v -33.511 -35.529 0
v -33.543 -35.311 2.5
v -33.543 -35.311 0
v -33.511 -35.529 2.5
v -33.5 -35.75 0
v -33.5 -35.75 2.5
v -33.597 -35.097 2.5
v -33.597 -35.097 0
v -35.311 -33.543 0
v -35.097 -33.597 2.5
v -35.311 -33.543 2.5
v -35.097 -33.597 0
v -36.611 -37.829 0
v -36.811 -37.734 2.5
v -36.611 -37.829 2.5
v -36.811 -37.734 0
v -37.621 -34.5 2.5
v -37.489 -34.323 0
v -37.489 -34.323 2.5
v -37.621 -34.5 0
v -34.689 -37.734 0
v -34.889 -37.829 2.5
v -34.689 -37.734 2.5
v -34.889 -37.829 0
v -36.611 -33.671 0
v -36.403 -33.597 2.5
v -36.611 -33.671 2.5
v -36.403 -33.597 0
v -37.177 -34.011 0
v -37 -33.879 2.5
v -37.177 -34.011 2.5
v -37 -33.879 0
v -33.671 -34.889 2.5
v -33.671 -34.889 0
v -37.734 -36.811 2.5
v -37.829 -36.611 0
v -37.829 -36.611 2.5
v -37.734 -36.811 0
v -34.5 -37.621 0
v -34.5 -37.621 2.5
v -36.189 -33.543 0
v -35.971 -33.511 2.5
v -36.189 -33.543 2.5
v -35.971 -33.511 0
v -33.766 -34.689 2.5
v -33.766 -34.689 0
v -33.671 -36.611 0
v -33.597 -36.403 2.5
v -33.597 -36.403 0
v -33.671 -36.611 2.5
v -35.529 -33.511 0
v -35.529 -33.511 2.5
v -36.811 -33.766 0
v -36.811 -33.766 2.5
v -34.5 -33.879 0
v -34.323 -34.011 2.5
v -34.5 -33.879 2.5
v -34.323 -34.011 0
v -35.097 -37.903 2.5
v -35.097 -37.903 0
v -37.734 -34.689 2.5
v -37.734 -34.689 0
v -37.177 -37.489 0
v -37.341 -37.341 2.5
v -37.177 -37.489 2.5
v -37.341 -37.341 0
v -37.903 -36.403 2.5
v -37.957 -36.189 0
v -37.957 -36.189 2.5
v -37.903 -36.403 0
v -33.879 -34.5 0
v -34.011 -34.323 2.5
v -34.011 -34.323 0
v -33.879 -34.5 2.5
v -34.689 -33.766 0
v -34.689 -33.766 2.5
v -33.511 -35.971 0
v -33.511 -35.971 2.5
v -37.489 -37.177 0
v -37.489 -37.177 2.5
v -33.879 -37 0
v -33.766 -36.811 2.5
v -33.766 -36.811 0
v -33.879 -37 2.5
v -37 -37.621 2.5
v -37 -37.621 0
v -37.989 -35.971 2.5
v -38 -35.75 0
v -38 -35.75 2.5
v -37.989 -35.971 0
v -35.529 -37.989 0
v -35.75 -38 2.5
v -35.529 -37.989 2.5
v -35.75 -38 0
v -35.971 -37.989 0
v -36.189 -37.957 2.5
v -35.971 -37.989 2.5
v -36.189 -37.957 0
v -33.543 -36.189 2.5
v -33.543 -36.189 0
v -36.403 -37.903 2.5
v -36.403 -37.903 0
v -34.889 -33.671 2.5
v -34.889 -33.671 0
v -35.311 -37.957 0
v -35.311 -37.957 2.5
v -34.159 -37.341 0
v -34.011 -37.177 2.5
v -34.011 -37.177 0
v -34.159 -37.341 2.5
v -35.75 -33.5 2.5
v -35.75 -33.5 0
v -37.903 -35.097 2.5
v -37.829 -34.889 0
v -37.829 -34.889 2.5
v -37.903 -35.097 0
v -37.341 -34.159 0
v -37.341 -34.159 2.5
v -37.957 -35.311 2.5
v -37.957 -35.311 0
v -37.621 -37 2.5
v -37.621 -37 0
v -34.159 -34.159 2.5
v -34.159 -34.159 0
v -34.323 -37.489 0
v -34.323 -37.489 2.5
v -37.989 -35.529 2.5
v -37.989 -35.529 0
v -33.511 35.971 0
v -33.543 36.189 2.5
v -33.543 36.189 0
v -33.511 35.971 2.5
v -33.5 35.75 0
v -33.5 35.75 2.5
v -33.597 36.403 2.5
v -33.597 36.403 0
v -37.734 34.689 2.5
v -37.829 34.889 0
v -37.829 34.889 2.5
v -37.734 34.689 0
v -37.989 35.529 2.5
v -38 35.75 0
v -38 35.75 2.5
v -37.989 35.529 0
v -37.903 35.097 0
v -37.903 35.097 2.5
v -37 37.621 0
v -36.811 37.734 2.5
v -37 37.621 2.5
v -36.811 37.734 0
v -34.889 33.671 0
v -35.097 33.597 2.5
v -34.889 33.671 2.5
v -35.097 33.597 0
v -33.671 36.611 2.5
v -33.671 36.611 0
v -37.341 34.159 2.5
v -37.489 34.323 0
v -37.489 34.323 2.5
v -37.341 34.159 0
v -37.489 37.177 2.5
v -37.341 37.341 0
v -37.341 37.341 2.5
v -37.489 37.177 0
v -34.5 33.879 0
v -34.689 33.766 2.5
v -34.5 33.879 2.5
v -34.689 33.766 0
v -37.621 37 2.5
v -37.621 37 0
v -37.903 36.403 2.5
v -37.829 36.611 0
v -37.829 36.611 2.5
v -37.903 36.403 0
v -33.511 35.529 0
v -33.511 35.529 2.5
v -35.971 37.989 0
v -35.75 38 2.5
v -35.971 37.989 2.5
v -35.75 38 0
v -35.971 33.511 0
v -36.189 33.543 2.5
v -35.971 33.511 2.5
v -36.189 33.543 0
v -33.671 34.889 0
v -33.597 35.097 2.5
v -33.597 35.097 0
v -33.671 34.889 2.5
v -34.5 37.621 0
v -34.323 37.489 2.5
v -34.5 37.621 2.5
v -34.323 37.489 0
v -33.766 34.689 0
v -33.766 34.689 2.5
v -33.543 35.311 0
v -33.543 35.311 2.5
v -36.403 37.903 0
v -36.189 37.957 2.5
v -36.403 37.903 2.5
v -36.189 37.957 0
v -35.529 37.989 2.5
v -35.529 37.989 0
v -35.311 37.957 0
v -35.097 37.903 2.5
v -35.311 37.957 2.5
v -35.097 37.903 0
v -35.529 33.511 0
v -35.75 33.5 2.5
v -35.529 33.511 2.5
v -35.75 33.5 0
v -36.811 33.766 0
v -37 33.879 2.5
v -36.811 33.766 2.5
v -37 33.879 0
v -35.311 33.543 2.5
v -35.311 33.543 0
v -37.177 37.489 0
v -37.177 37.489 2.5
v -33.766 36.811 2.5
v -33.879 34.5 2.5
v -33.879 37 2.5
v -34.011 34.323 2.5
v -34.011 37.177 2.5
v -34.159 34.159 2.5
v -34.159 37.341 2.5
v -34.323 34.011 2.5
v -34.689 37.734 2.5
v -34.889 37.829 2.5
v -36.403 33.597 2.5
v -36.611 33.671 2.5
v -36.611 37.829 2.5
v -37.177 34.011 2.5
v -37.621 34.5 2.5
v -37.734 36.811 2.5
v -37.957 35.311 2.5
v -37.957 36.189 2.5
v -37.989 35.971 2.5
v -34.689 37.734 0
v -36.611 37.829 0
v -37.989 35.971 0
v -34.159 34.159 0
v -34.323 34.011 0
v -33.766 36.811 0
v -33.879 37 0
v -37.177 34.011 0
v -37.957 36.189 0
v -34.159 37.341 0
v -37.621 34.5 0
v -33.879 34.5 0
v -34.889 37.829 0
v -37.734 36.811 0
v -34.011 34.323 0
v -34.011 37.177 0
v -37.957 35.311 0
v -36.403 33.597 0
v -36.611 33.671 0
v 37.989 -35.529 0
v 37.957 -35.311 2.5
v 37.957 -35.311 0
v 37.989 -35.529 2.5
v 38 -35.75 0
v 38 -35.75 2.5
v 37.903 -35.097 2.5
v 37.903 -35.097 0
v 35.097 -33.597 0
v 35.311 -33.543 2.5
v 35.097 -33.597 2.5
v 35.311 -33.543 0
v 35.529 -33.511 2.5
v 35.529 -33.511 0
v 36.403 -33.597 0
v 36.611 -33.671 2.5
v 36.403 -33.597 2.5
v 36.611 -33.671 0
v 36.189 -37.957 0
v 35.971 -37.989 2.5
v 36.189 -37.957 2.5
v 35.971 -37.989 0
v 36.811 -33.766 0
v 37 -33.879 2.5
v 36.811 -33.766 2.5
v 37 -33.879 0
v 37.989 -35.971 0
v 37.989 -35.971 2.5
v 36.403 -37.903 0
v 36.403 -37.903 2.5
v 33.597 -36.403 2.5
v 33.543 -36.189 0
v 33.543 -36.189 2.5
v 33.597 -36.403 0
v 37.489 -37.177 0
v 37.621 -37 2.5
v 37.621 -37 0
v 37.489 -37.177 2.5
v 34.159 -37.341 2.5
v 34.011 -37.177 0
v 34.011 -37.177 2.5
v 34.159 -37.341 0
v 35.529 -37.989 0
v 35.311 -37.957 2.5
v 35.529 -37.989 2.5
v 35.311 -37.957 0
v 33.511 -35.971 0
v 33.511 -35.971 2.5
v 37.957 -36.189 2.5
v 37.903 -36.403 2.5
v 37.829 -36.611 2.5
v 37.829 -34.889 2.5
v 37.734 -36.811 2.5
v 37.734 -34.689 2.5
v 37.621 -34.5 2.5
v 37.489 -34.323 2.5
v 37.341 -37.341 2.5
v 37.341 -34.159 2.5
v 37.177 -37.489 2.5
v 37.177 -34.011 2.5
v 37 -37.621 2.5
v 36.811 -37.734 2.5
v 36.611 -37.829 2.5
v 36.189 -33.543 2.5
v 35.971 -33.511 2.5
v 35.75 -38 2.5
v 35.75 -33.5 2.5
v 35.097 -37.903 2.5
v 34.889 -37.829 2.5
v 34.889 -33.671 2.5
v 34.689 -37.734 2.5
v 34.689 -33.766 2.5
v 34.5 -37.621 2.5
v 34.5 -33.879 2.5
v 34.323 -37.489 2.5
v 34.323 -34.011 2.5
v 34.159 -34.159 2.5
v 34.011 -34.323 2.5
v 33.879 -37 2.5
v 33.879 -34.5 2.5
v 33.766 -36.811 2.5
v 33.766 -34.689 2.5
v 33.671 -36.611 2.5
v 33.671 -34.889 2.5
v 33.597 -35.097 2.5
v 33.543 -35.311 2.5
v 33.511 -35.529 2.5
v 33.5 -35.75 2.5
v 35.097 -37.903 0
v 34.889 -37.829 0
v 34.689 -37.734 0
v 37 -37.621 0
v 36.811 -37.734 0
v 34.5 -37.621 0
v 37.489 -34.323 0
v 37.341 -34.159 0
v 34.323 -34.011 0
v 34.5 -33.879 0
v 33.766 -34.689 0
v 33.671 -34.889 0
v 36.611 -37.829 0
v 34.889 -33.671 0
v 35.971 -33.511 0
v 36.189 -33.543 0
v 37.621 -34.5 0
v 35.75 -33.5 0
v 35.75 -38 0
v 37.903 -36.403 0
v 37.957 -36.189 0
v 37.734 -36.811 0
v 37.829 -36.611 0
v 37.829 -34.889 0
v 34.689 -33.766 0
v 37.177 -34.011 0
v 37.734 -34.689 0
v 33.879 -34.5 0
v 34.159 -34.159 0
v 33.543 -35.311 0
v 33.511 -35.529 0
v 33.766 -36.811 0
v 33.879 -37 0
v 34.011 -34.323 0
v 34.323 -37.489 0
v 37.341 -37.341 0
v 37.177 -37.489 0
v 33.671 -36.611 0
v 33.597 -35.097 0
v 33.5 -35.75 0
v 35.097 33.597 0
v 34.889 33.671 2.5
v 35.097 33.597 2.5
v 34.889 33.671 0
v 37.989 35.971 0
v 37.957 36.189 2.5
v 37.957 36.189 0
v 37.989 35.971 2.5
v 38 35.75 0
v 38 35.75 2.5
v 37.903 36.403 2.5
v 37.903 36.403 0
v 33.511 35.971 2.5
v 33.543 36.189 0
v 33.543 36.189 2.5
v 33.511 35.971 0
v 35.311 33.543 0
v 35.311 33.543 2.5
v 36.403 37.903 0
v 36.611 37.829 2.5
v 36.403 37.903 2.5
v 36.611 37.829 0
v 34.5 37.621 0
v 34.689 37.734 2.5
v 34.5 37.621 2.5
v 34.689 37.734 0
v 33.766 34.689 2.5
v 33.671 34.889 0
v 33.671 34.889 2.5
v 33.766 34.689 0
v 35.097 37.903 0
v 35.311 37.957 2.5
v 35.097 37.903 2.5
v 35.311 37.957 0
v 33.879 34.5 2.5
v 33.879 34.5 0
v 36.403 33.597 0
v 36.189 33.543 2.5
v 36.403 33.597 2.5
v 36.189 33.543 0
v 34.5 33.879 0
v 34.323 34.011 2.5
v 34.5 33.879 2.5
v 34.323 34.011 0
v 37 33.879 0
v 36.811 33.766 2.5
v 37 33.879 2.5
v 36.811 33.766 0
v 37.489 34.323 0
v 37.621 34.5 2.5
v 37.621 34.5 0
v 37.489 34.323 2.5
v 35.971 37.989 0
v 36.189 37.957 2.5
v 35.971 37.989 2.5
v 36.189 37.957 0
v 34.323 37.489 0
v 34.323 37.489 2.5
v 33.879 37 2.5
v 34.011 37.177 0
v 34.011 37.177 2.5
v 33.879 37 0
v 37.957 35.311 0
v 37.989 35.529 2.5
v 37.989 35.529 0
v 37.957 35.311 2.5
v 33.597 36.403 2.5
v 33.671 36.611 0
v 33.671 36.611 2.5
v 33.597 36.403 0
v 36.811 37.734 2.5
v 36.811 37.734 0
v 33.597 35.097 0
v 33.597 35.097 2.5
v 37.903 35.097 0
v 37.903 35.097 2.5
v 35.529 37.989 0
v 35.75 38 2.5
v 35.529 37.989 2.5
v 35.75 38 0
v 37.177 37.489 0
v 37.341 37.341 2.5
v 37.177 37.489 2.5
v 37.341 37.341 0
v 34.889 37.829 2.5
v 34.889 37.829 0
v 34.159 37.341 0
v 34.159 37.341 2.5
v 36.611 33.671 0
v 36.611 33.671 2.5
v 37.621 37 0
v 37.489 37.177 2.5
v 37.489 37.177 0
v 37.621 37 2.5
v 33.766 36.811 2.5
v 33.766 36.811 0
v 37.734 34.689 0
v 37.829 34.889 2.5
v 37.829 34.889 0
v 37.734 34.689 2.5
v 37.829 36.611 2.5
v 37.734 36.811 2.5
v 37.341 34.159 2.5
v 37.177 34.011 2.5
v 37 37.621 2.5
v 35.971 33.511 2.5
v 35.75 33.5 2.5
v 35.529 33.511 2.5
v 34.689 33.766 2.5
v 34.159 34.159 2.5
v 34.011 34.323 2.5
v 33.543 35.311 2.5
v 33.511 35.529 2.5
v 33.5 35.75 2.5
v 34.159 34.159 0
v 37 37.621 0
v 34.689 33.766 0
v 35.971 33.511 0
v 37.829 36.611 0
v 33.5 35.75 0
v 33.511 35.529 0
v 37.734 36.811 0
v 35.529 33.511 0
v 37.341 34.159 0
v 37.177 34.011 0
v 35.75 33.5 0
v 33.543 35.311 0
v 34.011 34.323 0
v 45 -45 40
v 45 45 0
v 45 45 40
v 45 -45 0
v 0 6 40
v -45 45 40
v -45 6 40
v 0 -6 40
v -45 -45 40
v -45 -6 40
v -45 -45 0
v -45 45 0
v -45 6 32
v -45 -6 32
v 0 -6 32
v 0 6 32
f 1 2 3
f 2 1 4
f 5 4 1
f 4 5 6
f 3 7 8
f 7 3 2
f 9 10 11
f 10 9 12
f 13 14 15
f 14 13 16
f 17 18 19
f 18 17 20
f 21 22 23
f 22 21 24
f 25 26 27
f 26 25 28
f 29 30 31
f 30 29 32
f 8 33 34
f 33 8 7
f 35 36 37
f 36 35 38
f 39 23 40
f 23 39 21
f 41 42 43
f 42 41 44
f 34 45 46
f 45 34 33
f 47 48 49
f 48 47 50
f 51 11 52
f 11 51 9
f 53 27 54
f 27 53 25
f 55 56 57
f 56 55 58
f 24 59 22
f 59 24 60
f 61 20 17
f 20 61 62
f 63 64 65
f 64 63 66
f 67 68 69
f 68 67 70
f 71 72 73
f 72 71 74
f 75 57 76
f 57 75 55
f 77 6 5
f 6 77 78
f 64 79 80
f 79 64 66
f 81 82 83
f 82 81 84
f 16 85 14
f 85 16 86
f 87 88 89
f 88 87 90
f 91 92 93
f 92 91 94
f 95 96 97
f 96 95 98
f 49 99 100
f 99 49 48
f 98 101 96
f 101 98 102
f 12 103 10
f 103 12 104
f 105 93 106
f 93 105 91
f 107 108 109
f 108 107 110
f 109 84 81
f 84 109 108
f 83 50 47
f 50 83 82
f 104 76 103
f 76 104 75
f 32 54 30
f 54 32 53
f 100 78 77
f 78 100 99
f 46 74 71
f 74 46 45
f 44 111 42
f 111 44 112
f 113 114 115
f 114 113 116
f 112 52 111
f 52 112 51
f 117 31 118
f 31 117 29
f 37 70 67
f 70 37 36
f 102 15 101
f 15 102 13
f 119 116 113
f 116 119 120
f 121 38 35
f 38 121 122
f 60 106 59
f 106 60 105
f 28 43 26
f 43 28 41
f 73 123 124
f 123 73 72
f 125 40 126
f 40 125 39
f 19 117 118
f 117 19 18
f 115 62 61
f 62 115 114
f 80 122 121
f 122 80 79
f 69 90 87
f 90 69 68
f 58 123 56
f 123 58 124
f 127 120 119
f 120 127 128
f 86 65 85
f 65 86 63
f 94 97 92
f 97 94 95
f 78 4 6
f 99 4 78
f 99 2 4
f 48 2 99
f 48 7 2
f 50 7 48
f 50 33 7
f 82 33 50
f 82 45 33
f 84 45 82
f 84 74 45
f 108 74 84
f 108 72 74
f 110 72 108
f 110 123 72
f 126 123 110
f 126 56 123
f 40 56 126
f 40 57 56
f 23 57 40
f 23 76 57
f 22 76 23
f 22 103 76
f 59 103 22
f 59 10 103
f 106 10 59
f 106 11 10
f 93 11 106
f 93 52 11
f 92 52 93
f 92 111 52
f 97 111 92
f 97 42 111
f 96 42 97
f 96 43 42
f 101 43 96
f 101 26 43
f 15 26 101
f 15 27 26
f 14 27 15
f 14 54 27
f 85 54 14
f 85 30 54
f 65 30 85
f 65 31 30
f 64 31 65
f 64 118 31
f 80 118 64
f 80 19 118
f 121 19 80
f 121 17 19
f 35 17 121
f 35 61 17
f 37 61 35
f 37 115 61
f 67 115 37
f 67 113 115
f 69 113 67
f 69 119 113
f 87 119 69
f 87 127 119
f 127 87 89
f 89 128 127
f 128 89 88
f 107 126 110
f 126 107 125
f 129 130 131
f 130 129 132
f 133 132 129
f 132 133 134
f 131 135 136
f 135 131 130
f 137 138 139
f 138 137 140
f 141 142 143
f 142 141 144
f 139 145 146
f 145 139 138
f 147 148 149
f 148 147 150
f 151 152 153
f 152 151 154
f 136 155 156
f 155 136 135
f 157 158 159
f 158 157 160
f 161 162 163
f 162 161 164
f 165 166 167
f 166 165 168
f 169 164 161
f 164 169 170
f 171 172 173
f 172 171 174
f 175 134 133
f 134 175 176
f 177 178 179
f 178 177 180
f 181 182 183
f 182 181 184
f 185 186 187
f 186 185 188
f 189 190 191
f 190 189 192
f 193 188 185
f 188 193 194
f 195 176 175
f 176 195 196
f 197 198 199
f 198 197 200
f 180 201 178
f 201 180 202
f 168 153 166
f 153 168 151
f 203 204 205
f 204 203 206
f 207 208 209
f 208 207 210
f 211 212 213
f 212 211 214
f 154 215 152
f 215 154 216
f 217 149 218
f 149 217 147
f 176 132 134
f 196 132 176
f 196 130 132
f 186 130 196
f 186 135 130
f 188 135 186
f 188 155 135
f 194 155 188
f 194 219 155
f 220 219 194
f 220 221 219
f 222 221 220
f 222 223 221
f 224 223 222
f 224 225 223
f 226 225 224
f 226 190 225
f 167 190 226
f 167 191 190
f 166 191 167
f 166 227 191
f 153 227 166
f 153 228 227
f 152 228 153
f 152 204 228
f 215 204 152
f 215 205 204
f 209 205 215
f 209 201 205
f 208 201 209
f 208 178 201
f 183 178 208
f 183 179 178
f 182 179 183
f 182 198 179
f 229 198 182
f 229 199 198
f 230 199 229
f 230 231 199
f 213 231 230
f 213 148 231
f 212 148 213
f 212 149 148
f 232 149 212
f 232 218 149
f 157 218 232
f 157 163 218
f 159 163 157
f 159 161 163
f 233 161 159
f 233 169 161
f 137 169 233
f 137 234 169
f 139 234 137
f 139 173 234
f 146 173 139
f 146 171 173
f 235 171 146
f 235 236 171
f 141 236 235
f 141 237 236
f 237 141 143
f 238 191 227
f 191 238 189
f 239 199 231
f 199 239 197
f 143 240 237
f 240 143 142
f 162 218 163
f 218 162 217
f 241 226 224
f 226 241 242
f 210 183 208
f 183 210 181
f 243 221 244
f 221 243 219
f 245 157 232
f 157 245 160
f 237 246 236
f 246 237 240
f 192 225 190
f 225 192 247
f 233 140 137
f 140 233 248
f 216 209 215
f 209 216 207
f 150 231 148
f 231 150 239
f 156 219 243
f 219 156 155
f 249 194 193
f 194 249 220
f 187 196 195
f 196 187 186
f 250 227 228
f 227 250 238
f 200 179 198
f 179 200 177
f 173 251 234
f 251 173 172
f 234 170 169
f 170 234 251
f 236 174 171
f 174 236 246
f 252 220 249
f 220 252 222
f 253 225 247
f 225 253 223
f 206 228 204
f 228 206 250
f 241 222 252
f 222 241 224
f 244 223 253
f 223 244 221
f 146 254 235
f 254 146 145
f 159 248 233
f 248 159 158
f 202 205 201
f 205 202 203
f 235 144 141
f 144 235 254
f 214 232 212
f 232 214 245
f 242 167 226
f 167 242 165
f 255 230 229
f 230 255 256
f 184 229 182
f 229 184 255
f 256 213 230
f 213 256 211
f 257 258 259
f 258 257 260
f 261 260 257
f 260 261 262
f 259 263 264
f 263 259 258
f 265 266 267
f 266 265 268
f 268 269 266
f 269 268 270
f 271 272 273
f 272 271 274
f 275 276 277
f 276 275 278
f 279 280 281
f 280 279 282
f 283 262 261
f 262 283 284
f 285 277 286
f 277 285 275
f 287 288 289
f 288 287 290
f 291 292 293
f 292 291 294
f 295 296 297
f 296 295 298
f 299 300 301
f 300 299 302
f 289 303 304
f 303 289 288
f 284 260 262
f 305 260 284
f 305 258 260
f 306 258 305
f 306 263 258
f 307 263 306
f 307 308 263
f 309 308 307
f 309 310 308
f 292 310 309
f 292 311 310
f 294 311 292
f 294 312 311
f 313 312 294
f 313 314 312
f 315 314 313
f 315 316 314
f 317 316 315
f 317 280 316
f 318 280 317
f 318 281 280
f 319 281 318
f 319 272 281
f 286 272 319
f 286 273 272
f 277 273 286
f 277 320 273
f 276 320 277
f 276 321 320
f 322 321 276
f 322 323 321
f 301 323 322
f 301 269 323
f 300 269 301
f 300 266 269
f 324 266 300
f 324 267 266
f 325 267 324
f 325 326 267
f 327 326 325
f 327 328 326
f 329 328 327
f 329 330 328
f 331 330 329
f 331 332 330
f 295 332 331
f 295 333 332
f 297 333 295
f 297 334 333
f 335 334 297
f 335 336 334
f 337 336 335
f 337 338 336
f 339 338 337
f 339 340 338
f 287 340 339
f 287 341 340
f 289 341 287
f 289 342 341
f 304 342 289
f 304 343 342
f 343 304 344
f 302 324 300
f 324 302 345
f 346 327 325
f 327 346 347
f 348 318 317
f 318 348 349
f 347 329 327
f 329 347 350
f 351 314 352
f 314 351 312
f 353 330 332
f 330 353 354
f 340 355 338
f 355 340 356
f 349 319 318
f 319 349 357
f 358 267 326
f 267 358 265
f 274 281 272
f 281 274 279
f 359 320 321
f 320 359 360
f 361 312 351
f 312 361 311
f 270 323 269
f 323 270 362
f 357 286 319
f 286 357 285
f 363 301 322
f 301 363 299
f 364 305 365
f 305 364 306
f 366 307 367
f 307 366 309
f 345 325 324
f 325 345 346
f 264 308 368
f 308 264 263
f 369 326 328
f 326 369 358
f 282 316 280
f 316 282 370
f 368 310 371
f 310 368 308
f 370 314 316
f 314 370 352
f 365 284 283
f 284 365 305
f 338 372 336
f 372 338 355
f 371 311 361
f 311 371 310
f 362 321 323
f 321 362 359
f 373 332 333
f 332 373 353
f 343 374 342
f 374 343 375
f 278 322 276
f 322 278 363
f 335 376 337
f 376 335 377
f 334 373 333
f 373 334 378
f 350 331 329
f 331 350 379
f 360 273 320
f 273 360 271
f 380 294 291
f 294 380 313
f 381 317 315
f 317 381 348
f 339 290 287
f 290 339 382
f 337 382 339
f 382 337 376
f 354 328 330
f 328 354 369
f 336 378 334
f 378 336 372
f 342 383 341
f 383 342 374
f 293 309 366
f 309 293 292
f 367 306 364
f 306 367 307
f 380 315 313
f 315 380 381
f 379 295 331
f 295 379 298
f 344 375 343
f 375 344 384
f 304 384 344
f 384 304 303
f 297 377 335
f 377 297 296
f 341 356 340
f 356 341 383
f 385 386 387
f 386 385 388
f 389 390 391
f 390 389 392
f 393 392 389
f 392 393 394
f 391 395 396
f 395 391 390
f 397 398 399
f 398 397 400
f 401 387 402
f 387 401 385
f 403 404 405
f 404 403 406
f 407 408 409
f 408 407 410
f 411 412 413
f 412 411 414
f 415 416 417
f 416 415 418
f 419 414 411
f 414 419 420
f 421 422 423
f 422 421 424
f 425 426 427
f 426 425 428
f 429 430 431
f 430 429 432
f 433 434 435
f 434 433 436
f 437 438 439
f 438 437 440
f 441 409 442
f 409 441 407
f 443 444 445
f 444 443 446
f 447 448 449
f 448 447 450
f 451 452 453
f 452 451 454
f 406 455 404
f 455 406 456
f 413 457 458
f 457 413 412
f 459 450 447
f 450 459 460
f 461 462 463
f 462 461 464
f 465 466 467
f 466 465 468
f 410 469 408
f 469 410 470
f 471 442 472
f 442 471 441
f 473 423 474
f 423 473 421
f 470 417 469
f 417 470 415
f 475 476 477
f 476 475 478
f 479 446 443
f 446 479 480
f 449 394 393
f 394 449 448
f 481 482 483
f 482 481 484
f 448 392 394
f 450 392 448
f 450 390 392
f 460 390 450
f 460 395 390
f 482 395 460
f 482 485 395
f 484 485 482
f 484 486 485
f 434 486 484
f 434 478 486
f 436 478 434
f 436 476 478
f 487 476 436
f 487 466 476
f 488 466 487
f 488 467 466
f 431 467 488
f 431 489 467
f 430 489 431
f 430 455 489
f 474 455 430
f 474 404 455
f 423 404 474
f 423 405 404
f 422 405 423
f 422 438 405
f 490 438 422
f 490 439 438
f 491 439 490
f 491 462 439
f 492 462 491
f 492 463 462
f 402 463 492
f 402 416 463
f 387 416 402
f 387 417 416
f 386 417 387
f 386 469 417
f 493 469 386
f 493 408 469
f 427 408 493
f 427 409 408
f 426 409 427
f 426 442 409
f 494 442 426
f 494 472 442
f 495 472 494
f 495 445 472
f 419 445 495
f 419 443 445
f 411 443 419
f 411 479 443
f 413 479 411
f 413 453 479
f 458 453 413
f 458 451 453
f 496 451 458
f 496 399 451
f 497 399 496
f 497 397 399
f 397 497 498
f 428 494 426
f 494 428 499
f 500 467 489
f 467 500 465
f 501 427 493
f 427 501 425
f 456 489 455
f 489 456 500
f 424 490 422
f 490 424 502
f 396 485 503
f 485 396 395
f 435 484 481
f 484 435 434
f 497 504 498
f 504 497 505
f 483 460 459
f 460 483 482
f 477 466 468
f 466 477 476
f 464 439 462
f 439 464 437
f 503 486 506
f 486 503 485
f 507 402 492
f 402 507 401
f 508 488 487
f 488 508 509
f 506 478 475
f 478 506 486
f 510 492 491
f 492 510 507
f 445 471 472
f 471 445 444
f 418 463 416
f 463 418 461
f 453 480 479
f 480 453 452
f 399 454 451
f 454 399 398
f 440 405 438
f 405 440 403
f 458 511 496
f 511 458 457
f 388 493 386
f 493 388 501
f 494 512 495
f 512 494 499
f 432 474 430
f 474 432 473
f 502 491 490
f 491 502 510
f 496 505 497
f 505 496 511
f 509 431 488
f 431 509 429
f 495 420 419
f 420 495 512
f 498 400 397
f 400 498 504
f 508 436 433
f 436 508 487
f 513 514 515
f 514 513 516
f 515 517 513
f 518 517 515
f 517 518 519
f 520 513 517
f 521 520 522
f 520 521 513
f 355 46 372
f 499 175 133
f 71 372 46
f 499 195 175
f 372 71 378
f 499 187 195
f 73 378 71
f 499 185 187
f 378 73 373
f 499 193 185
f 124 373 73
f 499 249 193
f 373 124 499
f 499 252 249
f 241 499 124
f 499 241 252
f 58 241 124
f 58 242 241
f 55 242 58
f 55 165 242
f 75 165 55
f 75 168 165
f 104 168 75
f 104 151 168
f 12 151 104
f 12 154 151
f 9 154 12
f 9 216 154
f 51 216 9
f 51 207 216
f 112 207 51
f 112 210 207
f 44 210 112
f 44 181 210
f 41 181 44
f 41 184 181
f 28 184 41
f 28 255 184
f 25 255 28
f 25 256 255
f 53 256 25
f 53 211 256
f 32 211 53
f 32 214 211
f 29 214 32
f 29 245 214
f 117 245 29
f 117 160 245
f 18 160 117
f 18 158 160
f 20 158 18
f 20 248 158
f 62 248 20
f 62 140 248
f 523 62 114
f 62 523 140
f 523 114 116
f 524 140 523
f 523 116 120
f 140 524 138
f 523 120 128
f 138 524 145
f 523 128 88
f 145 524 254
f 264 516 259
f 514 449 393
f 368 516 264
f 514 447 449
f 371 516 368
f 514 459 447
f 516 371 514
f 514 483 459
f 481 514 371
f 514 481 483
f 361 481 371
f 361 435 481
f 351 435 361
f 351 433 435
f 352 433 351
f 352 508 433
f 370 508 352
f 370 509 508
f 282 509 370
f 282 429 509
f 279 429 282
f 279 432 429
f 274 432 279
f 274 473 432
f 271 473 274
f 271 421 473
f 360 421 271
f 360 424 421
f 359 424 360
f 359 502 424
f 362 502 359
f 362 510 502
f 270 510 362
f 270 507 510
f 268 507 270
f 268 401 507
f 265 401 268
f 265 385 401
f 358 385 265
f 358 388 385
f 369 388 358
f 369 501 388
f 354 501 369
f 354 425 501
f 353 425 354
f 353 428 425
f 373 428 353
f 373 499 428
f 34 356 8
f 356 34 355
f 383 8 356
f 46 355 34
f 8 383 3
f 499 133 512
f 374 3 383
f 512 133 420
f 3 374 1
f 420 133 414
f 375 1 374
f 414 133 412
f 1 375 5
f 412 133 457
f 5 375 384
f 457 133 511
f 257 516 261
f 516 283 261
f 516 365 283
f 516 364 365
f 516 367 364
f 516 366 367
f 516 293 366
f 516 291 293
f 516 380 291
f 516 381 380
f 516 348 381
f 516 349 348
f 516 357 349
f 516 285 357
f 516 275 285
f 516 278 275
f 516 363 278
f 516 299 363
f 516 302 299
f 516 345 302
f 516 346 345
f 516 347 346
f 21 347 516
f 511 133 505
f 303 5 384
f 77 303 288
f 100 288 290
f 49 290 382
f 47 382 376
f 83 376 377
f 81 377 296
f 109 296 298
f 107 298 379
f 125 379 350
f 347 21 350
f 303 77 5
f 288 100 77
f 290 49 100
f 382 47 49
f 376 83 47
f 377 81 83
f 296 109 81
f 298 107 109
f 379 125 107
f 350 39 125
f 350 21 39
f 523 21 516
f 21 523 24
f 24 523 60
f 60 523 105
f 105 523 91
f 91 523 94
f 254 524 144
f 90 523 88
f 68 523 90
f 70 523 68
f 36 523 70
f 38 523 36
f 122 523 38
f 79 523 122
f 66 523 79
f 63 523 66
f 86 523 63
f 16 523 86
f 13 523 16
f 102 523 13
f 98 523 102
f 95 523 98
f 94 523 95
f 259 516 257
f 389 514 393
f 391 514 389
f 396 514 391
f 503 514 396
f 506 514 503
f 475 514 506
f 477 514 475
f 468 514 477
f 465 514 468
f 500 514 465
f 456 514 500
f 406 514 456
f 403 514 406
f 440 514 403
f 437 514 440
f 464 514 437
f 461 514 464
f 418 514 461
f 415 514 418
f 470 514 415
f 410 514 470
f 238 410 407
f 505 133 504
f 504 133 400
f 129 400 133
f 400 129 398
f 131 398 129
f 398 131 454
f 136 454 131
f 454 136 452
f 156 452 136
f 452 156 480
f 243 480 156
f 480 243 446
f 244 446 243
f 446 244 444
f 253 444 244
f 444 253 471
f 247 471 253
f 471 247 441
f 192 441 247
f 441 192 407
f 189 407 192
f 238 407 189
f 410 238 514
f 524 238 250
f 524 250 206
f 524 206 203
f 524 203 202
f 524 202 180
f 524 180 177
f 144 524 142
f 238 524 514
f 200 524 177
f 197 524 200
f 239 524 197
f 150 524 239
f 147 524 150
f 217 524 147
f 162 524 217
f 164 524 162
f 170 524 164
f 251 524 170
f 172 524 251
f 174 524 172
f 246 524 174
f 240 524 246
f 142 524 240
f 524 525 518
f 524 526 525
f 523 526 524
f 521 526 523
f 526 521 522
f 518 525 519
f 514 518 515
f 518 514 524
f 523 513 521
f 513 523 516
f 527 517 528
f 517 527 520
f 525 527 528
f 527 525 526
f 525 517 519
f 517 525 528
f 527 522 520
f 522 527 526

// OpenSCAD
// Magnetic stirrer housing - upside-down open box over an 80 mm PC fan
// Print orientation: top plate on the bed (z = 0), walls rise to z = 40

// ---------- Parameters ----------
plate_t      = 2;     // top plate thickness
wall_t       = 2.5;   // wall thickness
open_top_z   = 40;    // height of the open top
outer_size   = 90;    // outer size in X and Y
hole_d       = 4.5;   // M4 screw hole diameter
hole_pitch   = 71.5;  // screw hole pattern size (square)
notch_w      = 12;    // cable notch width
notch_bottom = 32;    // notch floor height (notch runs z = 32 to 40)
eps          = 0.5;   // cutter overshoot past faces

$fn = 64;

// ---------- Model ----------
difference() {
    // Solid block
    translate([-outer_size/2, -outer_size/2, 0])
        cube([outer_size, outer_size, open_top_z]);

    // Screw holes through the top plate
    for (x = [-hole_pitch/2, hole_pitch/2])
        for (y = [-hole_pitch/2, hole_pitch/2])
            translate([x, y, -eps])
                cylinder(d = hole_d, h = plate_t + 2*eps);

    // Cable notch in one wall, centred along the wall
    translate([-outer_size/2, -notch_w/2, notch_bottom])
        cube([outer_size/2, notch_w, open_top_z - notch_bottom + eps]);
}
